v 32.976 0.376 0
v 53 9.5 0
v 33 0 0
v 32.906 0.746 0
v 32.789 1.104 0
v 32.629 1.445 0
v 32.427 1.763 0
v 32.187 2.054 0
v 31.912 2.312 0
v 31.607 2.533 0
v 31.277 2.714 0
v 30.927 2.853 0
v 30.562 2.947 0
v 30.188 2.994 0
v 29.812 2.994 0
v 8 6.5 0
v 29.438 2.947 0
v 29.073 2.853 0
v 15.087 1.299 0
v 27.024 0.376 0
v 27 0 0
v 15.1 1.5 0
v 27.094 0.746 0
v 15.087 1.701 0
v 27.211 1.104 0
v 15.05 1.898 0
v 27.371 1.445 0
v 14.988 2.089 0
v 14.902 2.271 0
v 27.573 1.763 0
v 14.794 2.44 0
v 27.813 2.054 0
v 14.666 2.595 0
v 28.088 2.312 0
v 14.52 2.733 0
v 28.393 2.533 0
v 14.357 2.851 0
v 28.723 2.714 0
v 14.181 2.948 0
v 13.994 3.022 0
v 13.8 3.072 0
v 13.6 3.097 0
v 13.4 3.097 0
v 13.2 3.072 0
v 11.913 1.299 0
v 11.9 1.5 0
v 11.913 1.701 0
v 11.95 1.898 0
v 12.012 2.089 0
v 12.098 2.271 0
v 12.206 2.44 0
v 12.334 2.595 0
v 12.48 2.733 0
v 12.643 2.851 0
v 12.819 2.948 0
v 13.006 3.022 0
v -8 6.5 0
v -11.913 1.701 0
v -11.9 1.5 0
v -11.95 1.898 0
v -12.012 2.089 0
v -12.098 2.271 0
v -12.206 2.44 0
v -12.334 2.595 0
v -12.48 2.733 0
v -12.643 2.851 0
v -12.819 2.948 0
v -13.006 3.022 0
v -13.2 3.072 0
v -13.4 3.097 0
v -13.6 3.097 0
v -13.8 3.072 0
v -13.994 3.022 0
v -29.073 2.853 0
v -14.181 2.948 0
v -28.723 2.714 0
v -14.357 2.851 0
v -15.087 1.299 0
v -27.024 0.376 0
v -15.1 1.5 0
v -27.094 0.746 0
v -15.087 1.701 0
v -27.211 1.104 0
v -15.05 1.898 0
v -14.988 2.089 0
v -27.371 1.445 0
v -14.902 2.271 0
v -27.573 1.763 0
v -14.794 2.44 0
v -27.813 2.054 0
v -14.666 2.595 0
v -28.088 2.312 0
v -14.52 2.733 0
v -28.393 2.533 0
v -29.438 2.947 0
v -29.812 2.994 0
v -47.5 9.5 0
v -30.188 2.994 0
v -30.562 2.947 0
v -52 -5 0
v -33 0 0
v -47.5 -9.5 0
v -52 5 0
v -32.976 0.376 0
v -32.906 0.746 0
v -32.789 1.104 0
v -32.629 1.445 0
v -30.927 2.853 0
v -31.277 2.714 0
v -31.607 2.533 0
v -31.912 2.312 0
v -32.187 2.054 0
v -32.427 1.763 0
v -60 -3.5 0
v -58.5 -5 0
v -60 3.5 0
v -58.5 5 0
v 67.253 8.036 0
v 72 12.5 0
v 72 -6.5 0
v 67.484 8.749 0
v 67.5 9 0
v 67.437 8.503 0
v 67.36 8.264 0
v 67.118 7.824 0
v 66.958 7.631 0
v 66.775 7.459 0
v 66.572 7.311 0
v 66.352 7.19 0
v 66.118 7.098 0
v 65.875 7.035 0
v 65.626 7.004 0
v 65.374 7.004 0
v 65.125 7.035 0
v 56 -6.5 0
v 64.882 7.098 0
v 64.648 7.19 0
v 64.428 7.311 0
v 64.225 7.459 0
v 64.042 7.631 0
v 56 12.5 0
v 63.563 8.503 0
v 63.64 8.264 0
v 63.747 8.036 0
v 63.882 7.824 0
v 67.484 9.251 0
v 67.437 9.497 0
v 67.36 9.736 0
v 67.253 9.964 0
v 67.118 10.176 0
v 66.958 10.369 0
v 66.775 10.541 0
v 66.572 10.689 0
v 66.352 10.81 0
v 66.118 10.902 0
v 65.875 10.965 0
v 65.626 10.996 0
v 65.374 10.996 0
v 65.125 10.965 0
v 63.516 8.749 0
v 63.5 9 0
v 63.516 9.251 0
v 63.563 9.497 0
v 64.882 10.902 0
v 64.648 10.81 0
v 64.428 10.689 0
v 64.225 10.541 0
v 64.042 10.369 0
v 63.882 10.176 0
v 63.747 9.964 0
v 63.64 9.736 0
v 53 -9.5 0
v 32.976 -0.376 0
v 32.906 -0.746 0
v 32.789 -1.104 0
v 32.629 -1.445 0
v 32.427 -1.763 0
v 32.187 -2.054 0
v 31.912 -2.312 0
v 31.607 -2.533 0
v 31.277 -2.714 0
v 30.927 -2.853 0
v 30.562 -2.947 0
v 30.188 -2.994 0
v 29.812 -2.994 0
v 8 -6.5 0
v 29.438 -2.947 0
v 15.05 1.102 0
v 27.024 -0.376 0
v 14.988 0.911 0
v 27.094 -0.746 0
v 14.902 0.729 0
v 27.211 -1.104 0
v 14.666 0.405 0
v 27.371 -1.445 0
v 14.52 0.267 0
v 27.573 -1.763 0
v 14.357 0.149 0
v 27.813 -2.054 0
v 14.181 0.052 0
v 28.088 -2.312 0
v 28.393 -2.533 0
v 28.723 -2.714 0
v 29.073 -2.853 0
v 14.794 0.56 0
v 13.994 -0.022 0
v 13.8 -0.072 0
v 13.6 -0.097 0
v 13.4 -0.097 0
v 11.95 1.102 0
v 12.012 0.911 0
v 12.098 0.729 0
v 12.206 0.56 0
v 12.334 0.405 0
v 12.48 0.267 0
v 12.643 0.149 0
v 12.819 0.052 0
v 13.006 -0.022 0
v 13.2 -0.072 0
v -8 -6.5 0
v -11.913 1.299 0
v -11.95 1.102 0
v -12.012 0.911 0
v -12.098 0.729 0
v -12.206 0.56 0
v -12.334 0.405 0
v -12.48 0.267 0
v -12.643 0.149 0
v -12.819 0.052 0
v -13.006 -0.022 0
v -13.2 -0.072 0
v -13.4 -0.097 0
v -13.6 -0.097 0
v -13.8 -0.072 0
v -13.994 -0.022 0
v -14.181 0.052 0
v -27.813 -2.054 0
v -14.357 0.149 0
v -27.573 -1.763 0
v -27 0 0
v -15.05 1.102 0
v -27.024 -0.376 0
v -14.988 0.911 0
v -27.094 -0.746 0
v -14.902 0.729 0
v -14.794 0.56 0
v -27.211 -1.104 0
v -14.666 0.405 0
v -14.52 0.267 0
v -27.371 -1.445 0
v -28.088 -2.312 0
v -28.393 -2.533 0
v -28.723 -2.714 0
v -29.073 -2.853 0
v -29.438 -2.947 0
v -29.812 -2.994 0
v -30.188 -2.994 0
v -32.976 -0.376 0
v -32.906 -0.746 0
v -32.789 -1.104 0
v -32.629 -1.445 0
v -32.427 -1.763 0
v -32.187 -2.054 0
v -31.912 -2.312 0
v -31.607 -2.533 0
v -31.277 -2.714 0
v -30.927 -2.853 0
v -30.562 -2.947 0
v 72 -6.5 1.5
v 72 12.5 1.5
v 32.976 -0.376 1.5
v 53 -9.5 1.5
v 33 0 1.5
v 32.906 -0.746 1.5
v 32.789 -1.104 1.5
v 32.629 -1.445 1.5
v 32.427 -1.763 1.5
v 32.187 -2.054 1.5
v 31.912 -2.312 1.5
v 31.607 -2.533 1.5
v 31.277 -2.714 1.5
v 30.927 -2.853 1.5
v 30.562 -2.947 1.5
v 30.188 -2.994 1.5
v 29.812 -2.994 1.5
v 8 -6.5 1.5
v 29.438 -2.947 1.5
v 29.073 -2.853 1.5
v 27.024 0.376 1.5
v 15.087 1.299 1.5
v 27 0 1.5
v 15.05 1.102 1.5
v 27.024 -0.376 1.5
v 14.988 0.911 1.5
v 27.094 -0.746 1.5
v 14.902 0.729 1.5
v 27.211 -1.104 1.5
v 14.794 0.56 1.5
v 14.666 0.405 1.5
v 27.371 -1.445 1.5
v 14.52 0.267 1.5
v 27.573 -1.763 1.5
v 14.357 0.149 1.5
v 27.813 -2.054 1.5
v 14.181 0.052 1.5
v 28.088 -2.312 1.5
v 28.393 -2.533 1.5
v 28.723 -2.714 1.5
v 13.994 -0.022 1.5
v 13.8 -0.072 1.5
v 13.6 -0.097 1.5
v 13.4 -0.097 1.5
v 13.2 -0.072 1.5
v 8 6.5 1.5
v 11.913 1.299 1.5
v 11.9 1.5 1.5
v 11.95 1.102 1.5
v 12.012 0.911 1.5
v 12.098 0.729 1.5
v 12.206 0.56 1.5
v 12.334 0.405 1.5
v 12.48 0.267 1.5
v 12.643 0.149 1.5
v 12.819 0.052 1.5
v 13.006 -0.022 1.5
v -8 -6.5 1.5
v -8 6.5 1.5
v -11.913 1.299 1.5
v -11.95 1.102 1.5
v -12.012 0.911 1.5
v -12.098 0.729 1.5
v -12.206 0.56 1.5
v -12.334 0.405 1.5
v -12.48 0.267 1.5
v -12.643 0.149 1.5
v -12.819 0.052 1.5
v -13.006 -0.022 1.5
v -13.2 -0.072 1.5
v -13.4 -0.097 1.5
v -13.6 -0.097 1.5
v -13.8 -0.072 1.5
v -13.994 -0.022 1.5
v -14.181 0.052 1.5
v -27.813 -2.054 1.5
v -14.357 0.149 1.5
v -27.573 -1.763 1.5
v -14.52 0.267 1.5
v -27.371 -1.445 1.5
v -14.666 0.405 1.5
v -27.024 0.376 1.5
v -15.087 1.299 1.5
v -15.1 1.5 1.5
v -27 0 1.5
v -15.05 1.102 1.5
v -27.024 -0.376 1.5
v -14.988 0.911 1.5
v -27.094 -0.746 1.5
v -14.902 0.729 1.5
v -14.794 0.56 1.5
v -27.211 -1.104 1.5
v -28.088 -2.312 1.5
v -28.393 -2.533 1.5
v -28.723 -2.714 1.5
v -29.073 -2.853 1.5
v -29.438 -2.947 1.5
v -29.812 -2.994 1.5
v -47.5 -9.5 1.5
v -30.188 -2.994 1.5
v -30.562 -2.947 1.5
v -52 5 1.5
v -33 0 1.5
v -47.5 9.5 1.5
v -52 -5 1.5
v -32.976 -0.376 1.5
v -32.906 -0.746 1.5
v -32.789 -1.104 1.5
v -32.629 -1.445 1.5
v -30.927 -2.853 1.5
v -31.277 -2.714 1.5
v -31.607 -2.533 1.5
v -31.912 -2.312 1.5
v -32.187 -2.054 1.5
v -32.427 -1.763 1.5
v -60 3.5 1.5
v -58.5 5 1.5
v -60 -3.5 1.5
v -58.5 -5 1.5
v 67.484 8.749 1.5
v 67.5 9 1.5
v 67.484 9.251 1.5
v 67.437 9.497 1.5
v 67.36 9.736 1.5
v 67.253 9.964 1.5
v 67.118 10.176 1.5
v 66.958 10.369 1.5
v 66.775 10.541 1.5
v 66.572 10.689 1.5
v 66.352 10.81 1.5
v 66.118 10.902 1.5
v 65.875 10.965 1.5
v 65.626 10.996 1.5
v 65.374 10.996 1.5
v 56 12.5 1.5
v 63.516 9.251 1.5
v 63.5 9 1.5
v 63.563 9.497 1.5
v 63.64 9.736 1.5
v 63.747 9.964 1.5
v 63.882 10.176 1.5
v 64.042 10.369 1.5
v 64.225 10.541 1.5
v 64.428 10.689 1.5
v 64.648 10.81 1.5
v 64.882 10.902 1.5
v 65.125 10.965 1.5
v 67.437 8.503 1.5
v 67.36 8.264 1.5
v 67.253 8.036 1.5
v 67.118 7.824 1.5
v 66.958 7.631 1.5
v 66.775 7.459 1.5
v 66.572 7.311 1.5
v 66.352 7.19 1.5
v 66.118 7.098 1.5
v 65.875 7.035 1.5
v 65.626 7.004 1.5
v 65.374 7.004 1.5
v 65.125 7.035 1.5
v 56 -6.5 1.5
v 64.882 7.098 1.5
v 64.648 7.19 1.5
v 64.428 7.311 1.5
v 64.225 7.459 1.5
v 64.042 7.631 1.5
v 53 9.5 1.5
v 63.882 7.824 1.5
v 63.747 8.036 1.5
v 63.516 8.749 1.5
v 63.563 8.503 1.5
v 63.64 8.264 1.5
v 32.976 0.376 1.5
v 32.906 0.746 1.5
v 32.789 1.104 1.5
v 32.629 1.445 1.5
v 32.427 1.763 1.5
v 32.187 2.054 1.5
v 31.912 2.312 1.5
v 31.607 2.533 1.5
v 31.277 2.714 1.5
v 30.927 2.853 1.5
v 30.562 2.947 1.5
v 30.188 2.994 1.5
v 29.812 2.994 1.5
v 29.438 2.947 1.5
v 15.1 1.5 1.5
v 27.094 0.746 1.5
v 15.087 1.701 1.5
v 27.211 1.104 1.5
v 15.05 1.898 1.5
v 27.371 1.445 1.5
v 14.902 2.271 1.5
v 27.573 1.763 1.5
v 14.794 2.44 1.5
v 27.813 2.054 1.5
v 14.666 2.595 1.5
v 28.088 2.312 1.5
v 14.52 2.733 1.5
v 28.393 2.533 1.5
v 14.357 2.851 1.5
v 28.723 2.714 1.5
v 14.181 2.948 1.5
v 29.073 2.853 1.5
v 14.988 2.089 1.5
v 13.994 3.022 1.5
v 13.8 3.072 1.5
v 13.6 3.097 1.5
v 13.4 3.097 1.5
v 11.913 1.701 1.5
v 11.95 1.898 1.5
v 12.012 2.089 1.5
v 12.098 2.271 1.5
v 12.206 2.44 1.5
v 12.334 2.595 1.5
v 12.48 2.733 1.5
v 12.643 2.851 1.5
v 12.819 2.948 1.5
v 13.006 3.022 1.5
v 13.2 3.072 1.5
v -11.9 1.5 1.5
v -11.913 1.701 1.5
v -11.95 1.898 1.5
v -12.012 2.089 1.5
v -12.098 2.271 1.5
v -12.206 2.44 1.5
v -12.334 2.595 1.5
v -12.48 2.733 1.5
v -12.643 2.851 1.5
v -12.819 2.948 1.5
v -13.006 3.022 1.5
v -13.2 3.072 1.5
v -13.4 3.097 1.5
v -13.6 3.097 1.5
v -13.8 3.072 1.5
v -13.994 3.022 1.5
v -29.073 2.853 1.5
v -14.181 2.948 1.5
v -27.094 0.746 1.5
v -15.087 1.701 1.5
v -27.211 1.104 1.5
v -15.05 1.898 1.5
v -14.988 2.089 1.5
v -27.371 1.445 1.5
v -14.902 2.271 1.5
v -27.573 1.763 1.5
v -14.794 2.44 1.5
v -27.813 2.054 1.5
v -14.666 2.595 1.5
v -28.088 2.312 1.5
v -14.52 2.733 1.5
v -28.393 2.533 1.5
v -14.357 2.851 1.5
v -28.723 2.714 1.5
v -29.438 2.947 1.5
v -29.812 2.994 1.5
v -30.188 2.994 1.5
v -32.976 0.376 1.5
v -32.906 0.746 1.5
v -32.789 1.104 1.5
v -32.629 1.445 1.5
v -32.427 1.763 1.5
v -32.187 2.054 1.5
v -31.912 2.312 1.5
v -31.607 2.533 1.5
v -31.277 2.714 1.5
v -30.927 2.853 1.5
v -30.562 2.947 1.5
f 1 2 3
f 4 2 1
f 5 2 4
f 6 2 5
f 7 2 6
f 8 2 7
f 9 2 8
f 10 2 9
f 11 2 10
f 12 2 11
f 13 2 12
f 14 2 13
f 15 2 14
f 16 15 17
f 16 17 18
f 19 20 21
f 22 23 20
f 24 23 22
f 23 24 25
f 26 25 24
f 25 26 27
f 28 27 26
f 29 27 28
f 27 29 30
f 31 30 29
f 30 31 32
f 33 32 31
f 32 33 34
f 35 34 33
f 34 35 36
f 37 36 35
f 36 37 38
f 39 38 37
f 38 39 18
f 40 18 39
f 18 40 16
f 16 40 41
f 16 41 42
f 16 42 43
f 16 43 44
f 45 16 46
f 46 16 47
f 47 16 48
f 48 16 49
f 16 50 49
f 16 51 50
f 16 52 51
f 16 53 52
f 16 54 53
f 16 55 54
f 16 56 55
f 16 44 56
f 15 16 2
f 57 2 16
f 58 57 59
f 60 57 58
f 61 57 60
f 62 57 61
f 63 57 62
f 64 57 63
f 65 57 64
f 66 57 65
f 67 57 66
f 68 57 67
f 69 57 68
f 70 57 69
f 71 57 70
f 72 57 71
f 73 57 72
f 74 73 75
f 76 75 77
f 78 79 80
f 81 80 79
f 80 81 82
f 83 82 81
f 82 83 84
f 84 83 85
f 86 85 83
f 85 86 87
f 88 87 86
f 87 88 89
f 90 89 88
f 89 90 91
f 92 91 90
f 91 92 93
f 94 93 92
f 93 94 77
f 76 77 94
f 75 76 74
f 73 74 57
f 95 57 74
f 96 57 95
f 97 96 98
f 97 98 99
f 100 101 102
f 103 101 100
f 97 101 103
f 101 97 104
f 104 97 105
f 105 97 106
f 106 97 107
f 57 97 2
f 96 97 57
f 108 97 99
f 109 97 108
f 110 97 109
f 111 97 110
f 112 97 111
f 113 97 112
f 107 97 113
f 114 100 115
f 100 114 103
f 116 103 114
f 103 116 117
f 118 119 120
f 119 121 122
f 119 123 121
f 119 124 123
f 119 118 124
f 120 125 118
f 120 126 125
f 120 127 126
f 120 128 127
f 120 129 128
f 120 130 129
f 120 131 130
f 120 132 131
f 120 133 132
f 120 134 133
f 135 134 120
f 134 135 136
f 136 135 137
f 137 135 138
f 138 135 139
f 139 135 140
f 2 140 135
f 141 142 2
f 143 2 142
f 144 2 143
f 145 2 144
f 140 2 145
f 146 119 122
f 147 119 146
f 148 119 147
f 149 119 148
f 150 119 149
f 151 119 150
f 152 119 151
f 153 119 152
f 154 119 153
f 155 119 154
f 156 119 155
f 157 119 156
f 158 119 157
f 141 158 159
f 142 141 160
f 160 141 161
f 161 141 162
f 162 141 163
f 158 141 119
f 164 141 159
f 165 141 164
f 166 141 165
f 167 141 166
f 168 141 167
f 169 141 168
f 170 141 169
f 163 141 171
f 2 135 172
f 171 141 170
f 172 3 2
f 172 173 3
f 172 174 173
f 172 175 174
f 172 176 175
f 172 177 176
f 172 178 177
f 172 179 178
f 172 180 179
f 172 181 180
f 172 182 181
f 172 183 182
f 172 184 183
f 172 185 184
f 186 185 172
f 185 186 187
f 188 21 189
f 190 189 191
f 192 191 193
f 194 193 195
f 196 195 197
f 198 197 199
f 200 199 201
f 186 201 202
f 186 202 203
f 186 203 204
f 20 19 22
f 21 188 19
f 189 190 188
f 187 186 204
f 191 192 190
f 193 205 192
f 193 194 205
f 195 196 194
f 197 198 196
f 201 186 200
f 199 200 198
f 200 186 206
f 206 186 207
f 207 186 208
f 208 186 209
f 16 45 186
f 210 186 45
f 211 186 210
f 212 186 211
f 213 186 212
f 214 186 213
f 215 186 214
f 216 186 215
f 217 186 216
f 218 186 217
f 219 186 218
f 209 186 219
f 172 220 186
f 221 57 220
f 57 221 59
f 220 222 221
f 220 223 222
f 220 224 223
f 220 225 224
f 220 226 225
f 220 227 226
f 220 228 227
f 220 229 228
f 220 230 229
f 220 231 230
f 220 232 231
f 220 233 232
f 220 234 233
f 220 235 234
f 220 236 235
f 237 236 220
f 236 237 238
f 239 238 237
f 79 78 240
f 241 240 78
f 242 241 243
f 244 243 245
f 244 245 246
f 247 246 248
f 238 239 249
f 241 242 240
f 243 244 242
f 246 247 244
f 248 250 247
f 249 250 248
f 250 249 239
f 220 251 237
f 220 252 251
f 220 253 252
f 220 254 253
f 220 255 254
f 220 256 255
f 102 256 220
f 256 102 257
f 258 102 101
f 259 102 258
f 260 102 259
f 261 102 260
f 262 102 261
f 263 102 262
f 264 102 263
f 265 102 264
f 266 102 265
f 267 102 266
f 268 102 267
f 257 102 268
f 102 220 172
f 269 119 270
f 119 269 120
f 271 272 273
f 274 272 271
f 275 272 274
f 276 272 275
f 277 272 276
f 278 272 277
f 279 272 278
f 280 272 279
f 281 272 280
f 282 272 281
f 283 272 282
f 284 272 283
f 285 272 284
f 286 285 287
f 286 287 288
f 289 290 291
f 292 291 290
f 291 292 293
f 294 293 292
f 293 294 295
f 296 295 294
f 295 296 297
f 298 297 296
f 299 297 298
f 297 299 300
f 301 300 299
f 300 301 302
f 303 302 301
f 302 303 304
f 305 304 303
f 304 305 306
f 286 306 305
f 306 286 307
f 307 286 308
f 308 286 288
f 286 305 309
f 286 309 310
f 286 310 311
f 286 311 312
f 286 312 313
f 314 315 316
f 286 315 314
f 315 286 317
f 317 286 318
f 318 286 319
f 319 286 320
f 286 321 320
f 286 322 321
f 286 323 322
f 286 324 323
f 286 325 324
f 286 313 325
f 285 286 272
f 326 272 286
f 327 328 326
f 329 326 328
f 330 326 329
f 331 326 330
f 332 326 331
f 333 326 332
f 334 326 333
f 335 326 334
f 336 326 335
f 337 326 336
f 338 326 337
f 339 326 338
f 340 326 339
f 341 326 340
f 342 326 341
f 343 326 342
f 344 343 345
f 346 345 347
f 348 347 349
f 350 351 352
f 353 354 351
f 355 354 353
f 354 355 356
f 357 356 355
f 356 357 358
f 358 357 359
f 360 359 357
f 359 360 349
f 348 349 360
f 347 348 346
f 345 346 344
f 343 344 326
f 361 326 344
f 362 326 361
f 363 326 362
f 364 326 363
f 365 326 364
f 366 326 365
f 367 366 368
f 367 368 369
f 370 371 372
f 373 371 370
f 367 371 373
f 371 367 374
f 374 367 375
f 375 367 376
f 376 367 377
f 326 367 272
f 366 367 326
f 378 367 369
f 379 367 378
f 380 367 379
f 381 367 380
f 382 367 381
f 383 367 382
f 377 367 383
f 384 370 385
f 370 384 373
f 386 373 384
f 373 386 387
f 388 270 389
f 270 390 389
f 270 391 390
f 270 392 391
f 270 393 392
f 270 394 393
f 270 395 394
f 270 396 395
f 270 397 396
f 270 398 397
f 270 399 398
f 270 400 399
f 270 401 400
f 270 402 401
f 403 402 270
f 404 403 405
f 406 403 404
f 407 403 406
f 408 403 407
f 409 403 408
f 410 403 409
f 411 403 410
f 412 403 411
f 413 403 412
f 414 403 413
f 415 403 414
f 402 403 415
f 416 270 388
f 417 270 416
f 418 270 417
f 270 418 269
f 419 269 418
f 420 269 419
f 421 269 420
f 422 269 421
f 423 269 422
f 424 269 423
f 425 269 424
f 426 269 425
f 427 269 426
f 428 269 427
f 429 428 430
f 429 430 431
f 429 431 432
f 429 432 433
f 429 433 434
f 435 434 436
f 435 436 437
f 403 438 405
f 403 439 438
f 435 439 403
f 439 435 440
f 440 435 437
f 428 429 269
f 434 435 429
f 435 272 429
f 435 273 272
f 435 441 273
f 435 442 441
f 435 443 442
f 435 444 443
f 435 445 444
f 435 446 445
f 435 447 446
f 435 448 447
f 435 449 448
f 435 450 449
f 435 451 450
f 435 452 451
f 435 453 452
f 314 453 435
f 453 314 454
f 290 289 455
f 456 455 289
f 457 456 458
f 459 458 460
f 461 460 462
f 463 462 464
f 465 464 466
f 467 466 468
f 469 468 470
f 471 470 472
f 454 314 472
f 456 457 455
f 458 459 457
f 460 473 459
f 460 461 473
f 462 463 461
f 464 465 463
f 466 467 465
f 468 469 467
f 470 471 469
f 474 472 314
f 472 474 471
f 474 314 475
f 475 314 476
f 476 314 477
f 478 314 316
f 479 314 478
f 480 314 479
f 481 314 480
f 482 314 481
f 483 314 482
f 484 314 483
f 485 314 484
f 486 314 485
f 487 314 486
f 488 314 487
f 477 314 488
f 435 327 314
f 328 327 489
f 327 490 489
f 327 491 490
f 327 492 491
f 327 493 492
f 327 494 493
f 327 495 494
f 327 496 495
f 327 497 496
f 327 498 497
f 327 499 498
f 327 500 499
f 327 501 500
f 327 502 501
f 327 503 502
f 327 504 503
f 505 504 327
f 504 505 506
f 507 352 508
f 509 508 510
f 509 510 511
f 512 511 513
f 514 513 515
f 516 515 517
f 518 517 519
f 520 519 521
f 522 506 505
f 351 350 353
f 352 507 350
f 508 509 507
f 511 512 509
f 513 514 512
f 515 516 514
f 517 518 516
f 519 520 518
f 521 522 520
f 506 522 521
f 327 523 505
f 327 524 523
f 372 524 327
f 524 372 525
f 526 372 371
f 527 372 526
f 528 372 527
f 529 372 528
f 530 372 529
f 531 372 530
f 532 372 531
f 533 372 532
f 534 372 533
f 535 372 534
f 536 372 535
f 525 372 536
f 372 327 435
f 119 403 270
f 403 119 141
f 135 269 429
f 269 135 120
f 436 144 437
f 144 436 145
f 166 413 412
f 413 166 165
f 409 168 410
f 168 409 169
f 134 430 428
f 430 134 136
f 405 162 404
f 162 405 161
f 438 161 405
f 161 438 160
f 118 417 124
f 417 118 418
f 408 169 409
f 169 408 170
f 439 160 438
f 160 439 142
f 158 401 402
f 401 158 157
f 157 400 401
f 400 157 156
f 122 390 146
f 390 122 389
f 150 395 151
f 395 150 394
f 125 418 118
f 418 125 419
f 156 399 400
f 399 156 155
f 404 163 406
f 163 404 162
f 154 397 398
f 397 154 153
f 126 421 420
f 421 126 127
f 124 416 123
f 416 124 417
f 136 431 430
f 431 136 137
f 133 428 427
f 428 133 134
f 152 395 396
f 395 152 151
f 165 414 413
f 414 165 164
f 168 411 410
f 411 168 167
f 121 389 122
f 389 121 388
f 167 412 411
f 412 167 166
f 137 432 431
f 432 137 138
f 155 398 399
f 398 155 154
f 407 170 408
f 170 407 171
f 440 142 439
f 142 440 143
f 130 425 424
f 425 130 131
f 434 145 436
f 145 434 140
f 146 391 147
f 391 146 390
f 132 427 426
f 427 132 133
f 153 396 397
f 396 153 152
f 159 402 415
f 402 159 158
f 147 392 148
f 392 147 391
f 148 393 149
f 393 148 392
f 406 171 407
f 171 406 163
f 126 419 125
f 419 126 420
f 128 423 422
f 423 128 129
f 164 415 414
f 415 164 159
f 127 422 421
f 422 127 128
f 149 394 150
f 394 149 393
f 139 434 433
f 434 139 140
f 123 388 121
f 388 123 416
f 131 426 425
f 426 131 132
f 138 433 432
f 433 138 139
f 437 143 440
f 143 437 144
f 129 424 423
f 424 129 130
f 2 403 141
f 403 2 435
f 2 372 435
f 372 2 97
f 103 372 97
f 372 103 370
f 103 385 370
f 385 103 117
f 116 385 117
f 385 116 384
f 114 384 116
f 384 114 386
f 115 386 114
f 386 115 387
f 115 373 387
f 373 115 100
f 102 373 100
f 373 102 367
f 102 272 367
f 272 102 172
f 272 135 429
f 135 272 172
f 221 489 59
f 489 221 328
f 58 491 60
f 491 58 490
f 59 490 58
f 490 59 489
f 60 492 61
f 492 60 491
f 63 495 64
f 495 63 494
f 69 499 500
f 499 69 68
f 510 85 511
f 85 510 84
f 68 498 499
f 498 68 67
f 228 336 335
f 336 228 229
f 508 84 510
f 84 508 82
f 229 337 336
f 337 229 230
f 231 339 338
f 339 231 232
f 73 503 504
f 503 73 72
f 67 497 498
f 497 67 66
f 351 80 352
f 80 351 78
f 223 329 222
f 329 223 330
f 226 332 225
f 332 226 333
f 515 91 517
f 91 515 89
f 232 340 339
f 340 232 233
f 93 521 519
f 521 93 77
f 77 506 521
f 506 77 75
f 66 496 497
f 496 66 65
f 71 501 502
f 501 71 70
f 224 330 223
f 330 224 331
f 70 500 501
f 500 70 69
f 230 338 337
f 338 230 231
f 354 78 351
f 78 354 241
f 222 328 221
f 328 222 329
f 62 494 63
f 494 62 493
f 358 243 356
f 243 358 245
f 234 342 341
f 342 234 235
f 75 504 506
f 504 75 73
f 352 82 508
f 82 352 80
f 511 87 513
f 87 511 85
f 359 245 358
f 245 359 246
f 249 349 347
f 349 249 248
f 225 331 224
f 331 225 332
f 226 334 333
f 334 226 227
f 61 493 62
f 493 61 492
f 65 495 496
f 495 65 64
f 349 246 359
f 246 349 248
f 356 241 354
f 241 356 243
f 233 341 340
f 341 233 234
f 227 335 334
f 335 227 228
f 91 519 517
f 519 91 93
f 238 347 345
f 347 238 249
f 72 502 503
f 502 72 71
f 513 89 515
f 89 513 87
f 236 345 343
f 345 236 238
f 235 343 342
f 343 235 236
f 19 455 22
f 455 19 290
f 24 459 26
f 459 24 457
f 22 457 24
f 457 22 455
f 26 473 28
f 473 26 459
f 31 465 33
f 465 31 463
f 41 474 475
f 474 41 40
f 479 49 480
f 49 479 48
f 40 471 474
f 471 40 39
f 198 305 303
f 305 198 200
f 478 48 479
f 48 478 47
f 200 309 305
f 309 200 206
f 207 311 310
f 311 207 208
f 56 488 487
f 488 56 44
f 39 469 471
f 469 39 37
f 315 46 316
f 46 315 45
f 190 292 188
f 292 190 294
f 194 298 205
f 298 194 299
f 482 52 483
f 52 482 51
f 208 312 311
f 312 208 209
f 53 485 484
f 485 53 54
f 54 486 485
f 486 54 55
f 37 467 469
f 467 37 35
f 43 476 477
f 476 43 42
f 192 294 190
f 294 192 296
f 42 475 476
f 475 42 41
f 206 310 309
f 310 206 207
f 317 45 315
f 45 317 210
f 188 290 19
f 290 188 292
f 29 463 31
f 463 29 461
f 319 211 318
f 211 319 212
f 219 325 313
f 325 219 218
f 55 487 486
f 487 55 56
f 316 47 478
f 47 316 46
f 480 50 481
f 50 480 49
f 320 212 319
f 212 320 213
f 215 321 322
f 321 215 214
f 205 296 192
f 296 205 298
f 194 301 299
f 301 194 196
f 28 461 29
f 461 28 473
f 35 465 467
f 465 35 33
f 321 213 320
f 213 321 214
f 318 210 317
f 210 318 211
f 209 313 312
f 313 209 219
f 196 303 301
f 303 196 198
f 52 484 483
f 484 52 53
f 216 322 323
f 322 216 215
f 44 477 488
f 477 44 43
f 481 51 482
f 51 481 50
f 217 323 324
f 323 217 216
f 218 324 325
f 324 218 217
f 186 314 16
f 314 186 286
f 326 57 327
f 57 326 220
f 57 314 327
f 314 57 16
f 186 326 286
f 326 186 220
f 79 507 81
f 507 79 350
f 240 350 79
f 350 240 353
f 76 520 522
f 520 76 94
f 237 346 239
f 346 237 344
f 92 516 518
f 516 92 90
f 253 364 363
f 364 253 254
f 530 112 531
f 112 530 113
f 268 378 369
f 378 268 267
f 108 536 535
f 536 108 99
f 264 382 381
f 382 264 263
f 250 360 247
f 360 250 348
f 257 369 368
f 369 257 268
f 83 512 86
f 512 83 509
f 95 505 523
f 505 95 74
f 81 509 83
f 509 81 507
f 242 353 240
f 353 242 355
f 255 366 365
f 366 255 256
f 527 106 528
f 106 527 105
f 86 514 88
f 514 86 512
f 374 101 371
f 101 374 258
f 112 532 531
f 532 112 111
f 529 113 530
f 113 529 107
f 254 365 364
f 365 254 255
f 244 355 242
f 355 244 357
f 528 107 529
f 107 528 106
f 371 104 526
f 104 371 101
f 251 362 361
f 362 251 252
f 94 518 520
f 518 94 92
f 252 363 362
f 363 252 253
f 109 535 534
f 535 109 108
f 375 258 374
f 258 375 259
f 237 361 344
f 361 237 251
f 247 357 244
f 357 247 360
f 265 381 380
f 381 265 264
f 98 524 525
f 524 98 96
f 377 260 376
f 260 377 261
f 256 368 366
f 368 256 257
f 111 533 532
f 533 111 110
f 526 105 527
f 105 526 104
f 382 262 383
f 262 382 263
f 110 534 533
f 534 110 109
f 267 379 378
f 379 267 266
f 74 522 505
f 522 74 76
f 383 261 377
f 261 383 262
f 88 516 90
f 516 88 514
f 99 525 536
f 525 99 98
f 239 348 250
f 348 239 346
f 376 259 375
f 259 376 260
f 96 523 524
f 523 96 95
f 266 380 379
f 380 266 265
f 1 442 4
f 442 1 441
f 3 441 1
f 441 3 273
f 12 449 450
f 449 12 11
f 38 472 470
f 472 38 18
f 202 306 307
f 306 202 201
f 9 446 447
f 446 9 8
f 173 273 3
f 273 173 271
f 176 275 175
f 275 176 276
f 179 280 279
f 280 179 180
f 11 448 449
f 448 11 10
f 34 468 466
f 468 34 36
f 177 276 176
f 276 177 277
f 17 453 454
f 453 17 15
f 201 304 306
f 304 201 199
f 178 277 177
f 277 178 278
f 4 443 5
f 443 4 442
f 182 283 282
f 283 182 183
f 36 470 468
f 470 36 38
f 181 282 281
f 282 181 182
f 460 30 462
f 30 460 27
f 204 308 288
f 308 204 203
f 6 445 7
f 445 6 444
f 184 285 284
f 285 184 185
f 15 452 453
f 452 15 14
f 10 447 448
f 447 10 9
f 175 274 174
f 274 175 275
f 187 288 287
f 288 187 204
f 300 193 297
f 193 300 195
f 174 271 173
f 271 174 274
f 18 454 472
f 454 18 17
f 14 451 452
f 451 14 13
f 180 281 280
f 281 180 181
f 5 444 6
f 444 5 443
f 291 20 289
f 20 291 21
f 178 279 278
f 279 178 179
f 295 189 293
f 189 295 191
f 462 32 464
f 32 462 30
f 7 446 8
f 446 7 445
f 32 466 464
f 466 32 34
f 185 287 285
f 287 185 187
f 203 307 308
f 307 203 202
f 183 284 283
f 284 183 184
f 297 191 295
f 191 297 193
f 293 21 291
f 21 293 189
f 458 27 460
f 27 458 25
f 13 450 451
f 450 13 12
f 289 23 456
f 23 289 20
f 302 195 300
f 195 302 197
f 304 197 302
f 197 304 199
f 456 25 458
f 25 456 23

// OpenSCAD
FLAT = true;

CHAMFER = 3;
WIDTH = 19;
LENGTH = 120;
THICKNESS = 1.5;

INSERT_WIDTH = 10;
INSERT_LENGTH = 8;

BACK_WIDTH = WIDTH;
BACK_LENGTH = 7;
BACK_OFFSET = 3;

TAB_WIDTH = BACK_WIDTH;
TAB_HEIGHT = 12;

MOUNT_HOLE_DIA = 4;
MOUNT_HOLE_HEIGHT = 5.5;
MOUNT_HOLE_OFFSET = 6 + BACK_OFFSET;

ETHERNET_WIDTH = 13;
ETHERNET_LENGTH = 16;
ETHERNET_HOLE_SPACING = 27;
ETHERNET_HOLE_OFFSET = 1.5;
ETHERNET_HOLE_DIA = 3.2;
ETHERNET_OFFSET = 0;

WIFI_HOLE_DIA = 6;
WIFI_OFFSETS = [-30, 30];


$fn = 50;

module tab() {
  difference() {
    translate([0, BACK_OFFSET, TAB_HEIGHT/2])
    cube([THICKNESS, TAB_WIDTH, TAB_HEIGHT], center = true);

    #translate([0, MOUNT_HOLE_OFFSET, MOUNT_HOLE_HEIGHT])
    rotate([0,90,0])
    cylinder(d = MOUNT_HOLE_DIA, h = THICKNESS, center = true);
  }
}

module pci_bracket() {
  union() {
    linear_extrude(THICKNESS)
    polygon(points = [
      [-LENGTH/2, INSERT_WIDTH/2 - CHAMFER/2],
      [-LENGTH/2 + CHAMFER/2, INSERT_WIDTH/2],
      [-LENGTH/2 + INSERT_LENGTH, INSERT_WIDTH/2],
      [-LENGTH/2 + INSERT_LENGTH + CHAMFER * 1.5, WIDTH/2],
      [LENGTH/2 - BACK_LENGTH, WIDTH/2],
      [LENGTH/2 - BACK_LENGTH + CHAMFER, BACK_WIDTH/2 + BACK_OFFSET],
      [LENGTH/2, BACK_WIDTH/2 + BACK_OFFSET],
      [LENGTH/2, - BACK_WIDTH/2 + BACK_OFFSET],
      [LENGTH/2 - BACK_LENGTH + CHAMFER, -BACK_WIDTH/2 + BACK_OFFSET],
      [LENGTH/2 - BACK_LENGTH, -WIDTH/2],
      [-LENGTH/2 + INSERT_LENGTH + CHAMFER * 1.5, -WIDTH/2],
      [-LENGTH/2 + INSERT_LENGTH, -INSERT_WIDTH/2],
      [-LENGTH/2 + CHAMFER/2, -INSERT_WIDTH/2],
      [-LENGTH/2, -INSERT_WIDTH/2 + CHAMFER/2]
    ]);

    if(FLAT) {
      translate([LENGTH/2, 0, THICKNESS/2])
      rotate([0, 90, 0])
      tab();
    } else {
      translate([LENGTH/2-THICKNESS/2, 0, 0])
      tab();
    }
  }
}

module ethernet_port() {
  translate([-ETHERNET_HOLE_SPACING/2, ETHERNET_HOLE_OFFSET, 0])
  cylinder(d = ETHERNET_HOLE_DIA, h = THICKNESS);
  translate([ETHERNET_HOLE_SPACING/2, ETHERNET_HOLE_OFFSET, 0])
  cylinder(d = ETHERNET_HOLE_DIA, h = THICKNESS);
  translate([-ETHERNET_LENGTH/2, -ETHERNET_WIDTH/2, 0])
  cube(size = [ETHERNET_LENGTH, ETHERNET_WIDTH, THICKNESS]);
}

module wifi_port() {
  cylinder(d = WIFI_HOLE_DIA, h = THICKNESS);
}

difference() {
  pci_bracket();
  #translate([ETHERNET_OFFSET, 0, 0])
  ethernet_port();

  #for(w = WIFI_OFFSETS) {
    translate([w, 0, 0])
    wifi_port();
  }
}
